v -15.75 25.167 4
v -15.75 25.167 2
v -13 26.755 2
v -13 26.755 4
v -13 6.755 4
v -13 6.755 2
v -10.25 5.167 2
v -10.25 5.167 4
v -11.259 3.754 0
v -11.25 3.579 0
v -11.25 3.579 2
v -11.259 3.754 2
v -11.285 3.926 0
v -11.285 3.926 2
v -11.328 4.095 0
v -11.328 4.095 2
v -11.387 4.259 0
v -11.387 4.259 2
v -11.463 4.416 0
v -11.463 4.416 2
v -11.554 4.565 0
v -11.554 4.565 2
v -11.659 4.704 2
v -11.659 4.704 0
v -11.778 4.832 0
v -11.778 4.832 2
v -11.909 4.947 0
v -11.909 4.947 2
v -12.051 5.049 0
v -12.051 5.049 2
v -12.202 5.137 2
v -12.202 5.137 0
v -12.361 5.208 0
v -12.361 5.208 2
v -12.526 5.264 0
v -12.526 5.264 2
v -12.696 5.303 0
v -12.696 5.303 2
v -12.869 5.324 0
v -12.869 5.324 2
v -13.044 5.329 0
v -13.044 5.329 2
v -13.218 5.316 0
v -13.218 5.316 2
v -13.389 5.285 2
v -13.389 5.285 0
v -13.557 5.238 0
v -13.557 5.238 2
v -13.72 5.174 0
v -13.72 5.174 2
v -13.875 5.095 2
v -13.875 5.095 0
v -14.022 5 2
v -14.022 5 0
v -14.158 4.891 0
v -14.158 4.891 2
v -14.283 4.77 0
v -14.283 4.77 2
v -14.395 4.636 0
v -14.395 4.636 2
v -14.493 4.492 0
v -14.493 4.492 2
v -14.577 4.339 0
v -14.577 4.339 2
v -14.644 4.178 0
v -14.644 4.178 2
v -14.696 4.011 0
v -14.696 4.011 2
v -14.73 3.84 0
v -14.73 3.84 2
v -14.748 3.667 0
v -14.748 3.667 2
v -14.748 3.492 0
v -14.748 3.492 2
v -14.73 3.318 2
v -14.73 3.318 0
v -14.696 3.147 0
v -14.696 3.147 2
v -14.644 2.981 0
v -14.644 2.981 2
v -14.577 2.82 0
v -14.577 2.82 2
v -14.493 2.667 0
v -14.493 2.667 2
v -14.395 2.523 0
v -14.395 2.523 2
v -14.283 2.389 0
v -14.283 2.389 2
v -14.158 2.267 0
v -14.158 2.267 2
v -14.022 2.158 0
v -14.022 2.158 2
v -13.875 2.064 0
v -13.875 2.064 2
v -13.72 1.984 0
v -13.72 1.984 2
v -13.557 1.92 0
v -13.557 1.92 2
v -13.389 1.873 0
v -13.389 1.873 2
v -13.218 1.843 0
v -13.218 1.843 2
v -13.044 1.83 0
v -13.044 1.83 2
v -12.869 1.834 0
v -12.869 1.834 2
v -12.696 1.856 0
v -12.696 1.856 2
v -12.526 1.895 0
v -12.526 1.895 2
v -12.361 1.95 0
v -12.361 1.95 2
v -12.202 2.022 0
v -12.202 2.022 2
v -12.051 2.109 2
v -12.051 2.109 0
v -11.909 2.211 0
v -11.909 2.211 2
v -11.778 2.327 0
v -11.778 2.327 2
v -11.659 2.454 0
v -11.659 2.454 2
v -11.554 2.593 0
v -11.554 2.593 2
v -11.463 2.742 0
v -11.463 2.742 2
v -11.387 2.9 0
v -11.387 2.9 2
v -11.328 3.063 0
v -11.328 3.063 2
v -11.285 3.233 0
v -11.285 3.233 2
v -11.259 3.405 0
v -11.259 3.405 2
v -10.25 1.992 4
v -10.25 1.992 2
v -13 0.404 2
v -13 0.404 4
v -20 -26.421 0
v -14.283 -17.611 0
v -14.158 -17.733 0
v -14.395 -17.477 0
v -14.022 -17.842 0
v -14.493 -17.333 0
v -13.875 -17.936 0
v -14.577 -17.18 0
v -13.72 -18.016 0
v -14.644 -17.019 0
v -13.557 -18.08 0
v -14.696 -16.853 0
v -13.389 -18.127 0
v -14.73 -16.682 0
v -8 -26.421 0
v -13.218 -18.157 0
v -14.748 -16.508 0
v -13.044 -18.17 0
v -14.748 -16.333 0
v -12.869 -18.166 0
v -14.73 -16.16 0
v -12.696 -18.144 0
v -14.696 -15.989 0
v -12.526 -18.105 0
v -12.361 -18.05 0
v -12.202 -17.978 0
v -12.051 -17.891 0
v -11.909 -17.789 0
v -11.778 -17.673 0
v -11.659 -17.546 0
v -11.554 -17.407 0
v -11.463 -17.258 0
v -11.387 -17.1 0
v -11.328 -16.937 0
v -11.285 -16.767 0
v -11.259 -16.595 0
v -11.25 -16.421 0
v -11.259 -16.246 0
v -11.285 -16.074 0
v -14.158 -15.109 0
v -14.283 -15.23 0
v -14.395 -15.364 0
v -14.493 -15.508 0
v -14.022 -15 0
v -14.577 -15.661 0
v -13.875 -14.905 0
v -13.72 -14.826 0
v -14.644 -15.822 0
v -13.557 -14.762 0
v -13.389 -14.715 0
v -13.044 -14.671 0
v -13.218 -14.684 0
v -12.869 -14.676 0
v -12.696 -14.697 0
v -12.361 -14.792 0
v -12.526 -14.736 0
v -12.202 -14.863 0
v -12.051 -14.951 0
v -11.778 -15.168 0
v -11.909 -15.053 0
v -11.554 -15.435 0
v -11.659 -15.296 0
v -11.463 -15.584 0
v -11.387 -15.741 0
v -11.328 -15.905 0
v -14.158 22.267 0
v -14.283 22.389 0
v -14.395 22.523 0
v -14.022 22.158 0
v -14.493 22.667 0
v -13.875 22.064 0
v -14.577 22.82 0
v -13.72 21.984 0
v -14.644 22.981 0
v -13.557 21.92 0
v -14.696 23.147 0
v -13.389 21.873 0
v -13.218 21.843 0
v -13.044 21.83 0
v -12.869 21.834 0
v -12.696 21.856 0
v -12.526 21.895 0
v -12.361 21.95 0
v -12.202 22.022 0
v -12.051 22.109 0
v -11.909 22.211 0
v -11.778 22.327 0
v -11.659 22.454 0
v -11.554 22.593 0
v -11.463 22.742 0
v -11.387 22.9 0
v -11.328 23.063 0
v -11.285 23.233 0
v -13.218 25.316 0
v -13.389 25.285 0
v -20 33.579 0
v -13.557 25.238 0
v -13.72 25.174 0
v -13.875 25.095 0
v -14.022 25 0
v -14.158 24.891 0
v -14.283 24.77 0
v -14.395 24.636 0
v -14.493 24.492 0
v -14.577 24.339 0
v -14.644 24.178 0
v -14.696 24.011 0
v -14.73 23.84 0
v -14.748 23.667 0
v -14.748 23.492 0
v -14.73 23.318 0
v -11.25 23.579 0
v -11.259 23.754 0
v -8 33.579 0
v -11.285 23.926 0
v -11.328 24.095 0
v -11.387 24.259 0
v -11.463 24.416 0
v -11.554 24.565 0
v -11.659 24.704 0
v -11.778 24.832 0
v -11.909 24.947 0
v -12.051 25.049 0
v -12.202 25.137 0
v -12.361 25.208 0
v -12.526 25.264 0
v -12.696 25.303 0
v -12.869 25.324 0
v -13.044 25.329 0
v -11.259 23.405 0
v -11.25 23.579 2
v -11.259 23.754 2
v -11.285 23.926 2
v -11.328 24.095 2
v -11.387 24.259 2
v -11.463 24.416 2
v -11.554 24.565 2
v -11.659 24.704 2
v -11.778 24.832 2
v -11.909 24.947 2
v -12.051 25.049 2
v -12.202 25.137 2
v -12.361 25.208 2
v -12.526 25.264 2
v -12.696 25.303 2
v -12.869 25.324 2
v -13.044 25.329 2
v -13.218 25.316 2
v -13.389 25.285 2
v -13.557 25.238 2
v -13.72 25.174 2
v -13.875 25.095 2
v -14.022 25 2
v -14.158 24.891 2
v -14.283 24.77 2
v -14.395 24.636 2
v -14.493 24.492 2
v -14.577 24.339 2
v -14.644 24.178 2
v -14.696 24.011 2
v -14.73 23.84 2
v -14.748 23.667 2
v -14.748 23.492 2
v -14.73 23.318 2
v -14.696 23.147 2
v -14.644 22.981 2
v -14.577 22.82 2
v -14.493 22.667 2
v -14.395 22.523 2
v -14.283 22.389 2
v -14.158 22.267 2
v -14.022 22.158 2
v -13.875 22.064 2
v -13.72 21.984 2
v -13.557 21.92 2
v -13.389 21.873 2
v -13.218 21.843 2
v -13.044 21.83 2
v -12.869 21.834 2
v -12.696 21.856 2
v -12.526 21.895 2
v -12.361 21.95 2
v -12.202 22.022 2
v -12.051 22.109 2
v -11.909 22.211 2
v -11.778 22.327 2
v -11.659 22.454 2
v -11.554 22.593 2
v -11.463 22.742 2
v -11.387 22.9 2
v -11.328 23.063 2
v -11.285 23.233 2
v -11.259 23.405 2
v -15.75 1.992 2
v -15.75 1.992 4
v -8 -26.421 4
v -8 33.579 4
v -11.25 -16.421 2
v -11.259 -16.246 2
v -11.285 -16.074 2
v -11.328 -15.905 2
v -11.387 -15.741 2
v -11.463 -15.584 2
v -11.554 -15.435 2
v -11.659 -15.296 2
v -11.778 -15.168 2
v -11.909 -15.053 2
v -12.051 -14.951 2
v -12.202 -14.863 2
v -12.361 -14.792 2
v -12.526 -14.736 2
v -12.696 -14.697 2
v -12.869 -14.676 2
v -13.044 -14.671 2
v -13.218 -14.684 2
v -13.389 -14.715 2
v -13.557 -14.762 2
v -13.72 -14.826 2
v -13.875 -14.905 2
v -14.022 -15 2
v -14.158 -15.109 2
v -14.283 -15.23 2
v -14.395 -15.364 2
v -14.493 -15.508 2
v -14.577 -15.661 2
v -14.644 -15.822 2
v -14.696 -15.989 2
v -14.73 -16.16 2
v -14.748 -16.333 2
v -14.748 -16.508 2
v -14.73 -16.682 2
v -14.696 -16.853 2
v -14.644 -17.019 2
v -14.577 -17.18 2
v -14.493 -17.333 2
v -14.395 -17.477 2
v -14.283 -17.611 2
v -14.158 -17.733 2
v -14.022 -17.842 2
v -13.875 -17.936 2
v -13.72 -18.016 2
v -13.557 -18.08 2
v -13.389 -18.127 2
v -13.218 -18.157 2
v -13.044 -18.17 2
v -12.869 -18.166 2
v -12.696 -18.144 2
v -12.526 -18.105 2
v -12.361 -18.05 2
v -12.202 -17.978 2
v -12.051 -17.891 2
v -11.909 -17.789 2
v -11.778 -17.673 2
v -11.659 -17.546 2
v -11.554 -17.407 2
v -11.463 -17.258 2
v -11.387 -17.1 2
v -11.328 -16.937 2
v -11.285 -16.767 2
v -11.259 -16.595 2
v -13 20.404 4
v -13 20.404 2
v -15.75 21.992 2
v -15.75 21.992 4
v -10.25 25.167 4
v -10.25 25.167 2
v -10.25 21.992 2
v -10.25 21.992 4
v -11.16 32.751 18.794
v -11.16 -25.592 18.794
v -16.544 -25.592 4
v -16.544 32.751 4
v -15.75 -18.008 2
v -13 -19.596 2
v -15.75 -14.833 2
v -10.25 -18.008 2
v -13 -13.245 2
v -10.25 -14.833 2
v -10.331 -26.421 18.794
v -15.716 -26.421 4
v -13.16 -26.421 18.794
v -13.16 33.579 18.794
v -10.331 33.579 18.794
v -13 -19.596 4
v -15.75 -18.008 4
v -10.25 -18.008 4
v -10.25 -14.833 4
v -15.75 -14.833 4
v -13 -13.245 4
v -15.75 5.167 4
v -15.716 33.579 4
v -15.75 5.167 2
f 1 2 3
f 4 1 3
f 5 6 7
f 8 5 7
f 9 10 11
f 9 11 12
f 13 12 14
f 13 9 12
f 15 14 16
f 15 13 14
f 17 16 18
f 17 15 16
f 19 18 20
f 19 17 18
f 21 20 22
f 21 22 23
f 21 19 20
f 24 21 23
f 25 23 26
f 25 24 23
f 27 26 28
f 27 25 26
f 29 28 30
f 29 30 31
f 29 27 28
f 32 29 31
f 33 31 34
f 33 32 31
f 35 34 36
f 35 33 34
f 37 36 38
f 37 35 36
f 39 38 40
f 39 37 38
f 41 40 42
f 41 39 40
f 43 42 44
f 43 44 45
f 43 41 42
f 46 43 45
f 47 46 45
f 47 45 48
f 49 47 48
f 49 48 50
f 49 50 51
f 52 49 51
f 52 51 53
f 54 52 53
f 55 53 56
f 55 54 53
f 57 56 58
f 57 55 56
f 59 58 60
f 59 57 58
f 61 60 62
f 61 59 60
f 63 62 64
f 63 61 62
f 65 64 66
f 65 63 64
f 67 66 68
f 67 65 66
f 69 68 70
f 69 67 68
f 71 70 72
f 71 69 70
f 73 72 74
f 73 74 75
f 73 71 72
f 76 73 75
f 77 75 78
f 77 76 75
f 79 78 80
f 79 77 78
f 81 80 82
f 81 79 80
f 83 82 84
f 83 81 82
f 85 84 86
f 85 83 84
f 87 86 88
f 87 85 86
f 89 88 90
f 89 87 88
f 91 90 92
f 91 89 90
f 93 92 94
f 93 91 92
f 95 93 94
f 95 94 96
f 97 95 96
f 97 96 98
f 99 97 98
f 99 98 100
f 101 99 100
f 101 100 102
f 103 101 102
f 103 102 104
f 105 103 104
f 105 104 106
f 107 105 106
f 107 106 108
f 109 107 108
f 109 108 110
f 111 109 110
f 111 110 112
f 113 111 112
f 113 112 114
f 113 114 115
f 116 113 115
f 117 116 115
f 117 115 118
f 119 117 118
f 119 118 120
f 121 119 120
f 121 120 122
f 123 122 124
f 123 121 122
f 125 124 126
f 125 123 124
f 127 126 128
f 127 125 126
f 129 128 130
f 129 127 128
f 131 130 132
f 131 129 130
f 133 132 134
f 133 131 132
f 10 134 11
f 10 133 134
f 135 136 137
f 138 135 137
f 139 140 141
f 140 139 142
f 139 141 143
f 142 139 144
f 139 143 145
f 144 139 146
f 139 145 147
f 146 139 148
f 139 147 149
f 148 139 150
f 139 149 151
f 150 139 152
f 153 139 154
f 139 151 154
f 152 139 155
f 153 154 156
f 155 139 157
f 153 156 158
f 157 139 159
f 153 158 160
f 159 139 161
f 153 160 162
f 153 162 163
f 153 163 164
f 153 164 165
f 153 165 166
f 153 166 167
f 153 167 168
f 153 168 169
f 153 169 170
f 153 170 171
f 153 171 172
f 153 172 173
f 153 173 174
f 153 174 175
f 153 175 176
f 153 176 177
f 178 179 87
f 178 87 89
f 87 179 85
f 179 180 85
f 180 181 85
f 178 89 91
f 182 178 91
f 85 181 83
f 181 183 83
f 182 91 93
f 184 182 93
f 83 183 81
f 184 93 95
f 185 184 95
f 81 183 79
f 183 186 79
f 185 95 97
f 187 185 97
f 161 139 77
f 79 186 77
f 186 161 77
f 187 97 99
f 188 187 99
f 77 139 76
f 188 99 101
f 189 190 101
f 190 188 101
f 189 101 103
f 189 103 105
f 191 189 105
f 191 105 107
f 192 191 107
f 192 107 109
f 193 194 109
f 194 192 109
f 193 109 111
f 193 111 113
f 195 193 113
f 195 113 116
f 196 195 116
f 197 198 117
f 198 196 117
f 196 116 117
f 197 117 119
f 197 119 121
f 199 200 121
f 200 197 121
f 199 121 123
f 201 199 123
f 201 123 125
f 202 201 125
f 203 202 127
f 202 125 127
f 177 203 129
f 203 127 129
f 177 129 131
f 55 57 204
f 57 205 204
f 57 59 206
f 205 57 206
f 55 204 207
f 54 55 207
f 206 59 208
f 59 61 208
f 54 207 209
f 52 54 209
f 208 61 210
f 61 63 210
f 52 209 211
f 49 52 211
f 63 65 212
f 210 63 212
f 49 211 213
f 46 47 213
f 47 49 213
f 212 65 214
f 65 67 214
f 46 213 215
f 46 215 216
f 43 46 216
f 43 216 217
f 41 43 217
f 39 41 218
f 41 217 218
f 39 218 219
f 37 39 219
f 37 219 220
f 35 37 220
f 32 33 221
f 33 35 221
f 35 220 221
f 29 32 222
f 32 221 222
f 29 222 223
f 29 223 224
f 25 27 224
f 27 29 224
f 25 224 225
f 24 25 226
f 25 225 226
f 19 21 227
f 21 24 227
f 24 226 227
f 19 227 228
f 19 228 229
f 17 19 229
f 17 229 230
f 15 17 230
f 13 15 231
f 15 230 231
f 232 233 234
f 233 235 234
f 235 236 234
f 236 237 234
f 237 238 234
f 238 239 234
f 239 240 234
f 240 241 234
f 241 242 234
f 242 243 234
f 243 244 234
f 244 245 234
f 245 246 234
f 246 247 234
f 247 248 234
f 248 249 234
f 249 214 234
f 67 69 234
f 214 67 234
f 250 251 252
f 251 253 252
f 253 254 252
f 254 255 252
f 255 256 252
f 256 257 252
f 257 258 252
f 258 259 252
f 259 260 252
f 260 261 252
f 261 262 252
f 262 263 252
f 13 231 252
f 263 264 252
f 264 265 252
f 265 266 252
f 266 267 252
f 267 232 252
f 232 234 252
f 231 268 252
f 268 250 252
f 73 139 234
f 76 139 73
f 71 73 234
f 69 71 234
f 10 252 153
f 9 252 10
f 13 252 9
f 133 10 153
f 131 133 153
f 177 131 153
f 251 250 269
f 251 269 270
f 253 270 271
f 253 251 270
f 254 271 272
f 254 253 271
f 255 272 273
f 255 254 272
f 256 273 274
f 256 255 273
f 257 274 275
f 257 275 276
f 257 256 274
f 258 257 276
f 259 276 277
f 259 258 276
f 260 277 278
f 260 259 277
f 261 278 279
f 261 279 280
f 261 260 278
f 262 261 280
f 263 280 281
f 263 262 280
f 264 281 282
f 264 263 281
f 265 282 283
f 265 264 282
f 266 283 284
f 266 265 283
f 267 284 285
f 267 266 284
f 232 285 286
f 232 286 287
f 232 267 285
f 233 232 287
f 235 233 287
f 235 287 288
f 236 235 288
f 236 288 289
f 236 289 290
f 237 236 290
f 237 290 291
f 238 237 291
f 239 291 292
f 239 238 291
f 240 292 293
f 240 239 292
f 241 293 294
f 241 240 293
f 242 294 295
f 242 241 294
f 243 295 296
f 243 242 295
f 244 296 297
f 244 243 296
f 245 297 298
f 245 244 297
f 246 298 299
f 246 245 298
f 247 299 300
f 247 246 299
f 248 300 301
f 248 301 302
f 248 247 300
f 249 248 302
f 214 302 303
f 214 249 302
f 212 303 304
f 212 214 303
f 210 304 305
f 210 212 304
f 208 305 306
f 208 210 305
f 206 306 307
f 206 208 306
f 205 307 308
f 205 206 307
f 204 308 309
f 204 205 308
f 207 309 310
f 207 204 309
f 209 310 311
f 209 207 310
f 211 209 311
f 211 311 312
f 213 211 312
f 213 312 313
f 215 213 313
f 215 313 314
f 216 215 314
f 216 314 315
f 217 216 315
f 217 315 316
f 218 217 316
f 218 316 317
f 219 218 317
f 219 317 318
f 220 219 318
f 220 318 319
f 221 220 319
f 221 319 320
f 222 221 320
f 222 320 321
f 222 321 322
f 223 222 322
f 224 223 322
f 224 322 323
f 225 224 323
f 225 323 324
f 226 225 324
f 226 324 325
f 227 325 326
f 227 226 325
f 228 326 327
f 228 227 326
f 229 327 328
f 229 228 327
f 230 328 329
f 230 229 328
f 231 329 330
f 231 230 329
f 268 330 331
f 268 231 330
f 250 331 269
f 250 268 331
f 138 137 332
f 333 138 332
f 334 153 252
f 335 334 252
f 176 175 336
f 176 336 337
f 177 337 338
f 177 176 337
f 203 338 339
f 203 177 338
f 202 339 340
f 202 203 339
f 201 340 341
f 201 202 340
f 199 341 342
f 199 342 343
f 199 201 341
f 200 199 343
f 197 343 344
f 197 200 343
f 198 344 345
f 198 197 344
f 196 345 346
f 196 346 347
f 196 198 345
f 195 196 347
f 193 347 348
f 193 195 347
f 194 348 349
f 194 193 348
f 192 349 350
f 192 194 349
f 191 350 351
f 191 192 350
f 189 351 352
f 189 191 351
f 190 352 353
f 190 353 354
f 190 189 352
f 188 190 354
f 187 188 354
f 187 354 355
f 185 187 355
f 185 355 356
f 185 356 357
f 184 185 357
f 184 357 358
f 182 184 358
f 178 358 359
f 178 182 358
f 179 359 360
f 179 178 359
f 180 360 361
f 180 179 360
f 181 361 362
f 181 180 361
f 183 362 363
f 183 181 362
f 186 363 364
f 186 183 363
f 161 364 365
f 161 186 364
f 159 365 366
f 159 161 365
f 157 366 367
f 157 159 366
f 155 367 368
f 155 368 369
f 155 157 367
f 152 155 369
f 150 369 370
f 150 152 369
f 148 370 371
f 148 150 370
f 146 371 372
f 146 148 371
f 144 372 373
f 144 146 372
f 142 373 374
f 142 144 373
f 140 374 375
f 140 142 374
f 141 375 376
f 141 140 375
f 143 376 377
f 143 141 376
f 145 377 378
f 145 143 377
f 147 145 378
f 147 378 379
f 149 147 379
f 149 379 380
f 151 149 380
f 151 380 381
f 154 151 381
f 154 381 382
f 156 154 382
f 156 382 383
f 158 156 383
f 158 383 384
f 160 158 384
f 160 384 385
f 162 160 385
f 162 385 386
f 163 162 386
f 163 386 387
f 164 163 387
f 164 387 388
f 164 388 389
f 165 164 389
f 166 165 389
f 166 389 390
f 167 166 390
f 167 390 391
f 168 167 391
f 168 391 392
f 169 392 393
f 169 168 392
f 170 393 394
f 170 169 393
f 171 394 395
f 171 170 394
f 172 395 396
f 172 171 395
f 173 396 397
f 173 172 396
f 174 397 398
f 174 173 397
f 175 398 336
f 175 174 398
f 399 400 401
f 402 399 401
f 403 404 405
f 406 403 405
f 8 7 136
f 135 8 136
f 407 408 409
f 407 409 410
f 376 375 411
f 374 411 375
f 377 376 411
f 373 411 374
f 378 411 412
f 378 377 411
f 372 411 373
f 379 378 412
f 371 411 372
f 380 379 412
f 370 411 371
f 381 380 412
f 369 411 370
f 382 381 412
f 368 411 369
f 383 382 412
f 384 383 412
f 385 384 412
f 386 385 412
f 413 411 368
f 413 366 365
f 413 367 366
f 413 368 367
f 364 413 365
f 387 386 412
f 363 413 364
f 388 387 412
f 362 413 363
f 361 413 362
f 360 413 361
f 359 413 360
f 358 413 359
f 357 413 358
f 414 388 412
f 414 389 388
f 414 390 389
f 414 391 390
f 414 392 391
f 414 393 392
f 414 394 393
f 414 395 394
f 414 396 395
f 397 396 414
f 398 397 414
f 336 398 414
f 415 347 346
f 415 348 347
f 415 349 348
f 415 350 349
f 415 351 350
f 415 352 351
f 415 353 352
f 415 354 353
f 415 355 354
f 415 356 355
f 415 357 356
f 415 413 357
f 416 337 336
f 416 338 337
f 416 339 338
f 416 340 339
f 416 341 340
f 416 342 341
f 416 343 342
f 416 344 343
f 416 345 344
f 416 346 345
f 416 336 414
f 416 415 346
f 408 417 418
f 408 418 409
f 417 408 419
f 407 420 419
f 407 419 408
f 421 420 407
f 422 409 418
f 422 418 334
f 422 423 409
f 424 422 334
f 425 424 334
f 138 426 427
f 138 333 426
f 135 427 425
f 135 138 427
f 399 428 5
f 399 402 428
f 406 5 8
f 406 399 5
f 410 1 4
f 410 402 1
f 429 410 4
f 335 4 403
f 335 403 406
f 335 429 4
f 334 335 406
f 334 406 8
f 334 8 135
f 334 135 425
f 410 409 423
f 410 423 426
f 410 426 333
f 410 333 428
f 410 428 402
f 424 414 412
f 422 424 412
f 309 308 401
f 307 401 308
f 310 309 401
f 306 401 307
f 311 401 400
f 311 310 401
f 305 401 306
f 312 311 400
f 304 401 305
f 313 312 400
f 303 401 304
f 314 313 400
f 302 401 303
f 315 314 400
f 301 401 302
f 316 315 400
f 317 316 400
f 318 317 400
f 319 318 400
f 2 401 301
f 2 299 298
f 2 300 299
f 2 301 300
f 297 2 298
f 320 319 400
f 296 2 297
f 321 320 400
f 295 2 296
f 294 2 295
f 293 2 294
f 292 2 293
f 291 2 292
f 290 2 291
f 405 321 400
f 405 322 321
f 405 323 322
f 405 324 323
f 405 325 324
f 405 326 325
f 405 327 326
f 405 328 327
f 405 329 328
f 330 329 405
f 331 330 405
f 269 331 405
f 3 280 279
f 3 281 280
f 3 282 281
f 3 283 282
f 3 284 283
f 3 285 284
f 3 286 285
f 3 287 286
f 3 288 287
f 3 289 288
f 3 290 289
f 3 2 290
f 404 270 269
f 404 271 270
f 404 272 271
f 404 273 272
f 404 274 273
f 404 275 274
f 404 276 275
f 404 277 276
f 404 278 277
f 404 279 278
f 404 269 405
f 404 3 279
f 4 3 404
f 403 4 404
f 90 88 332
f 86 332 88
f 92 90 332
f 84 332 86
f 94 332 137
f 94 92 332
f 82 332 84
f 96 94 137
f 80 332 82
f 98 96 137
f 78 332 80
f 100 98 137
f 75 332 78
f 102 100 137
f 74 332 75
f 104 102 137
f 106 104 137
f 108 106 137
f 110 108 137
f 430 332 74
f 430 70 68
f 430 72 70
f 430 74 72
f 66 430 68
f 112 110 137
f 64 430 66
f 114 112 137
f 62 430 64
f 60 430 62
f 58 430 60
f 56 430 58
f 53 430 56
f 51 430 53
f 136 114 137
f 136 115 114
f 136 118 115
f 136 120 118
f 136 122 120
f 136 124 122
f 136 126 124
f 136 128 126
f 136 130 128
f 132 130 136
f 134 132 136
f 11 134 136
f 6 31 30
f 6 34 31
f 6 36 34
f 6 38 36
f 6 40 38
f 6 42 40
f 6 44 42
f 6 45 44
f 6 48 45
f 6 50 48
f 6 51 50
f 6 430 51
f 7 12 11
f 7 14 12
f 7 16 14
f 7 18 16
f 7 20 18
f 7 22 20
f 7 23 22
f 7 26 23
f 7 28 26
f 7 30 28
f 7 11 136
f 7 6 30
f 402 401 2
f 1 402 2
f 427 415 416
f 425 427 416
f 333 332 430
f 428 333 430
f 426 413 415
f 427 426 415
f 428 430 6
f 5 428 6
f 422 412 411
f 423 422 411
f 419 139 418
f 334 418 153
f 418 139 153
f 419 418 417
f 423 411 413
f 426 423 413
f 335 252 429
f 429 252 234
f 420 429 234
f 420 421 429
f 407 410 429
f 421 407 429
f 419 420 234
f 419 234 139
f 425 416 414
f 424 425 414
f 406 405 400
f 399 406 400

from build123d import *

# Parameters (mm, degrees)
F3_DEPTH = 4
F0_R     = 1.75
F4_DEPTH = 2


with BuildPart() as f2:
    # F2: sweep along a path in F1
    with BuildLine(Plane.XZ) as f2_path:
        Line((0, 0), (6.840403, 18.793852))
    # F0 (on Top) → F2 (sweep)
    with BuildSketch(Plane.XY):
        Polygon((-17.171573, 33.579285), (-20, 33.579285), (-20, -26.420715), (-17.171573, -26.420715), (-18, -25.592288), (-18, 32.750857), align=None)
    sweep(path=f2_path.line)

    # F0 (on Top) → F3 (join)
    with BuildSketch(Plane.XY):
        Polygon((-8, 33.579285), (-17.171573, 33.579285), (-18, 32.750857), (-18, -25.592288), (-17.171573, -26.420715), (-8, -26.420715), align=None)
        Polygon((-13, -13.245289), (-10.25, -14.833002), (-10.25, -18.008429), (-13, -19.596142), (-15.75, -18.008429), (-15.75, -14.833002), align=None, mode=Mode.SUBTRACT)
        Polygon((-13, 6.754711), (-10.25, 5.166998), (-10.25, 1.991571), (-13, 0.403858), (-15.75, 1.991571), (-15.75, 5.166998), align=None, mode=Mode.SUBTRACT)
        Polygon((-13, 26.754711), (-10.25, 25.166998), (-10.25, 21.991571), (-13, 20.403858), (-15.75, 21.991571), (-15.75, 25.166998), align=None, mode=Mode.SUBTRACT)
    extrude(amount=F3_DEPTH)

    # F0 (on Top) → F4 (join)
    with BuildSketch(Plane.XY):
        Polygon((-10.25, 21.991571), (-10.25, 25.166998), (-13, 26.754711), (-15.75, 25.166998), (-15.75, 21.991571), (-13, 20.403858), align=None)
        with Locations((-13, 23.579285)):
            Circle(F0_R, mode=Mode.SUBTRACT)
        Polygon((-10.25, 1.991571), (-10.25, 5.166998), (-13, 6.754711), (-15.75, 5.166998), (-15.75, 1.991571), (-13, 0.403858), align=None)
        with Locations((-13, 3.579285)):
            Circle(F0_R, mode=Mode.SUBTRACT)
        Polygon((-10.25, -18.008429), (-10.25, -14.833002), (-13, -13.245289), (-15.75, -14.833002), (-15.75, -18.008429), (-13, -19.596142), align=None)
        with Locations((-13, -16.420715)):
            Circle(F0_R, mode=Mode.SUBTRACT)
    extrude(amount=F4_DEPTH)


solid = f2.part
